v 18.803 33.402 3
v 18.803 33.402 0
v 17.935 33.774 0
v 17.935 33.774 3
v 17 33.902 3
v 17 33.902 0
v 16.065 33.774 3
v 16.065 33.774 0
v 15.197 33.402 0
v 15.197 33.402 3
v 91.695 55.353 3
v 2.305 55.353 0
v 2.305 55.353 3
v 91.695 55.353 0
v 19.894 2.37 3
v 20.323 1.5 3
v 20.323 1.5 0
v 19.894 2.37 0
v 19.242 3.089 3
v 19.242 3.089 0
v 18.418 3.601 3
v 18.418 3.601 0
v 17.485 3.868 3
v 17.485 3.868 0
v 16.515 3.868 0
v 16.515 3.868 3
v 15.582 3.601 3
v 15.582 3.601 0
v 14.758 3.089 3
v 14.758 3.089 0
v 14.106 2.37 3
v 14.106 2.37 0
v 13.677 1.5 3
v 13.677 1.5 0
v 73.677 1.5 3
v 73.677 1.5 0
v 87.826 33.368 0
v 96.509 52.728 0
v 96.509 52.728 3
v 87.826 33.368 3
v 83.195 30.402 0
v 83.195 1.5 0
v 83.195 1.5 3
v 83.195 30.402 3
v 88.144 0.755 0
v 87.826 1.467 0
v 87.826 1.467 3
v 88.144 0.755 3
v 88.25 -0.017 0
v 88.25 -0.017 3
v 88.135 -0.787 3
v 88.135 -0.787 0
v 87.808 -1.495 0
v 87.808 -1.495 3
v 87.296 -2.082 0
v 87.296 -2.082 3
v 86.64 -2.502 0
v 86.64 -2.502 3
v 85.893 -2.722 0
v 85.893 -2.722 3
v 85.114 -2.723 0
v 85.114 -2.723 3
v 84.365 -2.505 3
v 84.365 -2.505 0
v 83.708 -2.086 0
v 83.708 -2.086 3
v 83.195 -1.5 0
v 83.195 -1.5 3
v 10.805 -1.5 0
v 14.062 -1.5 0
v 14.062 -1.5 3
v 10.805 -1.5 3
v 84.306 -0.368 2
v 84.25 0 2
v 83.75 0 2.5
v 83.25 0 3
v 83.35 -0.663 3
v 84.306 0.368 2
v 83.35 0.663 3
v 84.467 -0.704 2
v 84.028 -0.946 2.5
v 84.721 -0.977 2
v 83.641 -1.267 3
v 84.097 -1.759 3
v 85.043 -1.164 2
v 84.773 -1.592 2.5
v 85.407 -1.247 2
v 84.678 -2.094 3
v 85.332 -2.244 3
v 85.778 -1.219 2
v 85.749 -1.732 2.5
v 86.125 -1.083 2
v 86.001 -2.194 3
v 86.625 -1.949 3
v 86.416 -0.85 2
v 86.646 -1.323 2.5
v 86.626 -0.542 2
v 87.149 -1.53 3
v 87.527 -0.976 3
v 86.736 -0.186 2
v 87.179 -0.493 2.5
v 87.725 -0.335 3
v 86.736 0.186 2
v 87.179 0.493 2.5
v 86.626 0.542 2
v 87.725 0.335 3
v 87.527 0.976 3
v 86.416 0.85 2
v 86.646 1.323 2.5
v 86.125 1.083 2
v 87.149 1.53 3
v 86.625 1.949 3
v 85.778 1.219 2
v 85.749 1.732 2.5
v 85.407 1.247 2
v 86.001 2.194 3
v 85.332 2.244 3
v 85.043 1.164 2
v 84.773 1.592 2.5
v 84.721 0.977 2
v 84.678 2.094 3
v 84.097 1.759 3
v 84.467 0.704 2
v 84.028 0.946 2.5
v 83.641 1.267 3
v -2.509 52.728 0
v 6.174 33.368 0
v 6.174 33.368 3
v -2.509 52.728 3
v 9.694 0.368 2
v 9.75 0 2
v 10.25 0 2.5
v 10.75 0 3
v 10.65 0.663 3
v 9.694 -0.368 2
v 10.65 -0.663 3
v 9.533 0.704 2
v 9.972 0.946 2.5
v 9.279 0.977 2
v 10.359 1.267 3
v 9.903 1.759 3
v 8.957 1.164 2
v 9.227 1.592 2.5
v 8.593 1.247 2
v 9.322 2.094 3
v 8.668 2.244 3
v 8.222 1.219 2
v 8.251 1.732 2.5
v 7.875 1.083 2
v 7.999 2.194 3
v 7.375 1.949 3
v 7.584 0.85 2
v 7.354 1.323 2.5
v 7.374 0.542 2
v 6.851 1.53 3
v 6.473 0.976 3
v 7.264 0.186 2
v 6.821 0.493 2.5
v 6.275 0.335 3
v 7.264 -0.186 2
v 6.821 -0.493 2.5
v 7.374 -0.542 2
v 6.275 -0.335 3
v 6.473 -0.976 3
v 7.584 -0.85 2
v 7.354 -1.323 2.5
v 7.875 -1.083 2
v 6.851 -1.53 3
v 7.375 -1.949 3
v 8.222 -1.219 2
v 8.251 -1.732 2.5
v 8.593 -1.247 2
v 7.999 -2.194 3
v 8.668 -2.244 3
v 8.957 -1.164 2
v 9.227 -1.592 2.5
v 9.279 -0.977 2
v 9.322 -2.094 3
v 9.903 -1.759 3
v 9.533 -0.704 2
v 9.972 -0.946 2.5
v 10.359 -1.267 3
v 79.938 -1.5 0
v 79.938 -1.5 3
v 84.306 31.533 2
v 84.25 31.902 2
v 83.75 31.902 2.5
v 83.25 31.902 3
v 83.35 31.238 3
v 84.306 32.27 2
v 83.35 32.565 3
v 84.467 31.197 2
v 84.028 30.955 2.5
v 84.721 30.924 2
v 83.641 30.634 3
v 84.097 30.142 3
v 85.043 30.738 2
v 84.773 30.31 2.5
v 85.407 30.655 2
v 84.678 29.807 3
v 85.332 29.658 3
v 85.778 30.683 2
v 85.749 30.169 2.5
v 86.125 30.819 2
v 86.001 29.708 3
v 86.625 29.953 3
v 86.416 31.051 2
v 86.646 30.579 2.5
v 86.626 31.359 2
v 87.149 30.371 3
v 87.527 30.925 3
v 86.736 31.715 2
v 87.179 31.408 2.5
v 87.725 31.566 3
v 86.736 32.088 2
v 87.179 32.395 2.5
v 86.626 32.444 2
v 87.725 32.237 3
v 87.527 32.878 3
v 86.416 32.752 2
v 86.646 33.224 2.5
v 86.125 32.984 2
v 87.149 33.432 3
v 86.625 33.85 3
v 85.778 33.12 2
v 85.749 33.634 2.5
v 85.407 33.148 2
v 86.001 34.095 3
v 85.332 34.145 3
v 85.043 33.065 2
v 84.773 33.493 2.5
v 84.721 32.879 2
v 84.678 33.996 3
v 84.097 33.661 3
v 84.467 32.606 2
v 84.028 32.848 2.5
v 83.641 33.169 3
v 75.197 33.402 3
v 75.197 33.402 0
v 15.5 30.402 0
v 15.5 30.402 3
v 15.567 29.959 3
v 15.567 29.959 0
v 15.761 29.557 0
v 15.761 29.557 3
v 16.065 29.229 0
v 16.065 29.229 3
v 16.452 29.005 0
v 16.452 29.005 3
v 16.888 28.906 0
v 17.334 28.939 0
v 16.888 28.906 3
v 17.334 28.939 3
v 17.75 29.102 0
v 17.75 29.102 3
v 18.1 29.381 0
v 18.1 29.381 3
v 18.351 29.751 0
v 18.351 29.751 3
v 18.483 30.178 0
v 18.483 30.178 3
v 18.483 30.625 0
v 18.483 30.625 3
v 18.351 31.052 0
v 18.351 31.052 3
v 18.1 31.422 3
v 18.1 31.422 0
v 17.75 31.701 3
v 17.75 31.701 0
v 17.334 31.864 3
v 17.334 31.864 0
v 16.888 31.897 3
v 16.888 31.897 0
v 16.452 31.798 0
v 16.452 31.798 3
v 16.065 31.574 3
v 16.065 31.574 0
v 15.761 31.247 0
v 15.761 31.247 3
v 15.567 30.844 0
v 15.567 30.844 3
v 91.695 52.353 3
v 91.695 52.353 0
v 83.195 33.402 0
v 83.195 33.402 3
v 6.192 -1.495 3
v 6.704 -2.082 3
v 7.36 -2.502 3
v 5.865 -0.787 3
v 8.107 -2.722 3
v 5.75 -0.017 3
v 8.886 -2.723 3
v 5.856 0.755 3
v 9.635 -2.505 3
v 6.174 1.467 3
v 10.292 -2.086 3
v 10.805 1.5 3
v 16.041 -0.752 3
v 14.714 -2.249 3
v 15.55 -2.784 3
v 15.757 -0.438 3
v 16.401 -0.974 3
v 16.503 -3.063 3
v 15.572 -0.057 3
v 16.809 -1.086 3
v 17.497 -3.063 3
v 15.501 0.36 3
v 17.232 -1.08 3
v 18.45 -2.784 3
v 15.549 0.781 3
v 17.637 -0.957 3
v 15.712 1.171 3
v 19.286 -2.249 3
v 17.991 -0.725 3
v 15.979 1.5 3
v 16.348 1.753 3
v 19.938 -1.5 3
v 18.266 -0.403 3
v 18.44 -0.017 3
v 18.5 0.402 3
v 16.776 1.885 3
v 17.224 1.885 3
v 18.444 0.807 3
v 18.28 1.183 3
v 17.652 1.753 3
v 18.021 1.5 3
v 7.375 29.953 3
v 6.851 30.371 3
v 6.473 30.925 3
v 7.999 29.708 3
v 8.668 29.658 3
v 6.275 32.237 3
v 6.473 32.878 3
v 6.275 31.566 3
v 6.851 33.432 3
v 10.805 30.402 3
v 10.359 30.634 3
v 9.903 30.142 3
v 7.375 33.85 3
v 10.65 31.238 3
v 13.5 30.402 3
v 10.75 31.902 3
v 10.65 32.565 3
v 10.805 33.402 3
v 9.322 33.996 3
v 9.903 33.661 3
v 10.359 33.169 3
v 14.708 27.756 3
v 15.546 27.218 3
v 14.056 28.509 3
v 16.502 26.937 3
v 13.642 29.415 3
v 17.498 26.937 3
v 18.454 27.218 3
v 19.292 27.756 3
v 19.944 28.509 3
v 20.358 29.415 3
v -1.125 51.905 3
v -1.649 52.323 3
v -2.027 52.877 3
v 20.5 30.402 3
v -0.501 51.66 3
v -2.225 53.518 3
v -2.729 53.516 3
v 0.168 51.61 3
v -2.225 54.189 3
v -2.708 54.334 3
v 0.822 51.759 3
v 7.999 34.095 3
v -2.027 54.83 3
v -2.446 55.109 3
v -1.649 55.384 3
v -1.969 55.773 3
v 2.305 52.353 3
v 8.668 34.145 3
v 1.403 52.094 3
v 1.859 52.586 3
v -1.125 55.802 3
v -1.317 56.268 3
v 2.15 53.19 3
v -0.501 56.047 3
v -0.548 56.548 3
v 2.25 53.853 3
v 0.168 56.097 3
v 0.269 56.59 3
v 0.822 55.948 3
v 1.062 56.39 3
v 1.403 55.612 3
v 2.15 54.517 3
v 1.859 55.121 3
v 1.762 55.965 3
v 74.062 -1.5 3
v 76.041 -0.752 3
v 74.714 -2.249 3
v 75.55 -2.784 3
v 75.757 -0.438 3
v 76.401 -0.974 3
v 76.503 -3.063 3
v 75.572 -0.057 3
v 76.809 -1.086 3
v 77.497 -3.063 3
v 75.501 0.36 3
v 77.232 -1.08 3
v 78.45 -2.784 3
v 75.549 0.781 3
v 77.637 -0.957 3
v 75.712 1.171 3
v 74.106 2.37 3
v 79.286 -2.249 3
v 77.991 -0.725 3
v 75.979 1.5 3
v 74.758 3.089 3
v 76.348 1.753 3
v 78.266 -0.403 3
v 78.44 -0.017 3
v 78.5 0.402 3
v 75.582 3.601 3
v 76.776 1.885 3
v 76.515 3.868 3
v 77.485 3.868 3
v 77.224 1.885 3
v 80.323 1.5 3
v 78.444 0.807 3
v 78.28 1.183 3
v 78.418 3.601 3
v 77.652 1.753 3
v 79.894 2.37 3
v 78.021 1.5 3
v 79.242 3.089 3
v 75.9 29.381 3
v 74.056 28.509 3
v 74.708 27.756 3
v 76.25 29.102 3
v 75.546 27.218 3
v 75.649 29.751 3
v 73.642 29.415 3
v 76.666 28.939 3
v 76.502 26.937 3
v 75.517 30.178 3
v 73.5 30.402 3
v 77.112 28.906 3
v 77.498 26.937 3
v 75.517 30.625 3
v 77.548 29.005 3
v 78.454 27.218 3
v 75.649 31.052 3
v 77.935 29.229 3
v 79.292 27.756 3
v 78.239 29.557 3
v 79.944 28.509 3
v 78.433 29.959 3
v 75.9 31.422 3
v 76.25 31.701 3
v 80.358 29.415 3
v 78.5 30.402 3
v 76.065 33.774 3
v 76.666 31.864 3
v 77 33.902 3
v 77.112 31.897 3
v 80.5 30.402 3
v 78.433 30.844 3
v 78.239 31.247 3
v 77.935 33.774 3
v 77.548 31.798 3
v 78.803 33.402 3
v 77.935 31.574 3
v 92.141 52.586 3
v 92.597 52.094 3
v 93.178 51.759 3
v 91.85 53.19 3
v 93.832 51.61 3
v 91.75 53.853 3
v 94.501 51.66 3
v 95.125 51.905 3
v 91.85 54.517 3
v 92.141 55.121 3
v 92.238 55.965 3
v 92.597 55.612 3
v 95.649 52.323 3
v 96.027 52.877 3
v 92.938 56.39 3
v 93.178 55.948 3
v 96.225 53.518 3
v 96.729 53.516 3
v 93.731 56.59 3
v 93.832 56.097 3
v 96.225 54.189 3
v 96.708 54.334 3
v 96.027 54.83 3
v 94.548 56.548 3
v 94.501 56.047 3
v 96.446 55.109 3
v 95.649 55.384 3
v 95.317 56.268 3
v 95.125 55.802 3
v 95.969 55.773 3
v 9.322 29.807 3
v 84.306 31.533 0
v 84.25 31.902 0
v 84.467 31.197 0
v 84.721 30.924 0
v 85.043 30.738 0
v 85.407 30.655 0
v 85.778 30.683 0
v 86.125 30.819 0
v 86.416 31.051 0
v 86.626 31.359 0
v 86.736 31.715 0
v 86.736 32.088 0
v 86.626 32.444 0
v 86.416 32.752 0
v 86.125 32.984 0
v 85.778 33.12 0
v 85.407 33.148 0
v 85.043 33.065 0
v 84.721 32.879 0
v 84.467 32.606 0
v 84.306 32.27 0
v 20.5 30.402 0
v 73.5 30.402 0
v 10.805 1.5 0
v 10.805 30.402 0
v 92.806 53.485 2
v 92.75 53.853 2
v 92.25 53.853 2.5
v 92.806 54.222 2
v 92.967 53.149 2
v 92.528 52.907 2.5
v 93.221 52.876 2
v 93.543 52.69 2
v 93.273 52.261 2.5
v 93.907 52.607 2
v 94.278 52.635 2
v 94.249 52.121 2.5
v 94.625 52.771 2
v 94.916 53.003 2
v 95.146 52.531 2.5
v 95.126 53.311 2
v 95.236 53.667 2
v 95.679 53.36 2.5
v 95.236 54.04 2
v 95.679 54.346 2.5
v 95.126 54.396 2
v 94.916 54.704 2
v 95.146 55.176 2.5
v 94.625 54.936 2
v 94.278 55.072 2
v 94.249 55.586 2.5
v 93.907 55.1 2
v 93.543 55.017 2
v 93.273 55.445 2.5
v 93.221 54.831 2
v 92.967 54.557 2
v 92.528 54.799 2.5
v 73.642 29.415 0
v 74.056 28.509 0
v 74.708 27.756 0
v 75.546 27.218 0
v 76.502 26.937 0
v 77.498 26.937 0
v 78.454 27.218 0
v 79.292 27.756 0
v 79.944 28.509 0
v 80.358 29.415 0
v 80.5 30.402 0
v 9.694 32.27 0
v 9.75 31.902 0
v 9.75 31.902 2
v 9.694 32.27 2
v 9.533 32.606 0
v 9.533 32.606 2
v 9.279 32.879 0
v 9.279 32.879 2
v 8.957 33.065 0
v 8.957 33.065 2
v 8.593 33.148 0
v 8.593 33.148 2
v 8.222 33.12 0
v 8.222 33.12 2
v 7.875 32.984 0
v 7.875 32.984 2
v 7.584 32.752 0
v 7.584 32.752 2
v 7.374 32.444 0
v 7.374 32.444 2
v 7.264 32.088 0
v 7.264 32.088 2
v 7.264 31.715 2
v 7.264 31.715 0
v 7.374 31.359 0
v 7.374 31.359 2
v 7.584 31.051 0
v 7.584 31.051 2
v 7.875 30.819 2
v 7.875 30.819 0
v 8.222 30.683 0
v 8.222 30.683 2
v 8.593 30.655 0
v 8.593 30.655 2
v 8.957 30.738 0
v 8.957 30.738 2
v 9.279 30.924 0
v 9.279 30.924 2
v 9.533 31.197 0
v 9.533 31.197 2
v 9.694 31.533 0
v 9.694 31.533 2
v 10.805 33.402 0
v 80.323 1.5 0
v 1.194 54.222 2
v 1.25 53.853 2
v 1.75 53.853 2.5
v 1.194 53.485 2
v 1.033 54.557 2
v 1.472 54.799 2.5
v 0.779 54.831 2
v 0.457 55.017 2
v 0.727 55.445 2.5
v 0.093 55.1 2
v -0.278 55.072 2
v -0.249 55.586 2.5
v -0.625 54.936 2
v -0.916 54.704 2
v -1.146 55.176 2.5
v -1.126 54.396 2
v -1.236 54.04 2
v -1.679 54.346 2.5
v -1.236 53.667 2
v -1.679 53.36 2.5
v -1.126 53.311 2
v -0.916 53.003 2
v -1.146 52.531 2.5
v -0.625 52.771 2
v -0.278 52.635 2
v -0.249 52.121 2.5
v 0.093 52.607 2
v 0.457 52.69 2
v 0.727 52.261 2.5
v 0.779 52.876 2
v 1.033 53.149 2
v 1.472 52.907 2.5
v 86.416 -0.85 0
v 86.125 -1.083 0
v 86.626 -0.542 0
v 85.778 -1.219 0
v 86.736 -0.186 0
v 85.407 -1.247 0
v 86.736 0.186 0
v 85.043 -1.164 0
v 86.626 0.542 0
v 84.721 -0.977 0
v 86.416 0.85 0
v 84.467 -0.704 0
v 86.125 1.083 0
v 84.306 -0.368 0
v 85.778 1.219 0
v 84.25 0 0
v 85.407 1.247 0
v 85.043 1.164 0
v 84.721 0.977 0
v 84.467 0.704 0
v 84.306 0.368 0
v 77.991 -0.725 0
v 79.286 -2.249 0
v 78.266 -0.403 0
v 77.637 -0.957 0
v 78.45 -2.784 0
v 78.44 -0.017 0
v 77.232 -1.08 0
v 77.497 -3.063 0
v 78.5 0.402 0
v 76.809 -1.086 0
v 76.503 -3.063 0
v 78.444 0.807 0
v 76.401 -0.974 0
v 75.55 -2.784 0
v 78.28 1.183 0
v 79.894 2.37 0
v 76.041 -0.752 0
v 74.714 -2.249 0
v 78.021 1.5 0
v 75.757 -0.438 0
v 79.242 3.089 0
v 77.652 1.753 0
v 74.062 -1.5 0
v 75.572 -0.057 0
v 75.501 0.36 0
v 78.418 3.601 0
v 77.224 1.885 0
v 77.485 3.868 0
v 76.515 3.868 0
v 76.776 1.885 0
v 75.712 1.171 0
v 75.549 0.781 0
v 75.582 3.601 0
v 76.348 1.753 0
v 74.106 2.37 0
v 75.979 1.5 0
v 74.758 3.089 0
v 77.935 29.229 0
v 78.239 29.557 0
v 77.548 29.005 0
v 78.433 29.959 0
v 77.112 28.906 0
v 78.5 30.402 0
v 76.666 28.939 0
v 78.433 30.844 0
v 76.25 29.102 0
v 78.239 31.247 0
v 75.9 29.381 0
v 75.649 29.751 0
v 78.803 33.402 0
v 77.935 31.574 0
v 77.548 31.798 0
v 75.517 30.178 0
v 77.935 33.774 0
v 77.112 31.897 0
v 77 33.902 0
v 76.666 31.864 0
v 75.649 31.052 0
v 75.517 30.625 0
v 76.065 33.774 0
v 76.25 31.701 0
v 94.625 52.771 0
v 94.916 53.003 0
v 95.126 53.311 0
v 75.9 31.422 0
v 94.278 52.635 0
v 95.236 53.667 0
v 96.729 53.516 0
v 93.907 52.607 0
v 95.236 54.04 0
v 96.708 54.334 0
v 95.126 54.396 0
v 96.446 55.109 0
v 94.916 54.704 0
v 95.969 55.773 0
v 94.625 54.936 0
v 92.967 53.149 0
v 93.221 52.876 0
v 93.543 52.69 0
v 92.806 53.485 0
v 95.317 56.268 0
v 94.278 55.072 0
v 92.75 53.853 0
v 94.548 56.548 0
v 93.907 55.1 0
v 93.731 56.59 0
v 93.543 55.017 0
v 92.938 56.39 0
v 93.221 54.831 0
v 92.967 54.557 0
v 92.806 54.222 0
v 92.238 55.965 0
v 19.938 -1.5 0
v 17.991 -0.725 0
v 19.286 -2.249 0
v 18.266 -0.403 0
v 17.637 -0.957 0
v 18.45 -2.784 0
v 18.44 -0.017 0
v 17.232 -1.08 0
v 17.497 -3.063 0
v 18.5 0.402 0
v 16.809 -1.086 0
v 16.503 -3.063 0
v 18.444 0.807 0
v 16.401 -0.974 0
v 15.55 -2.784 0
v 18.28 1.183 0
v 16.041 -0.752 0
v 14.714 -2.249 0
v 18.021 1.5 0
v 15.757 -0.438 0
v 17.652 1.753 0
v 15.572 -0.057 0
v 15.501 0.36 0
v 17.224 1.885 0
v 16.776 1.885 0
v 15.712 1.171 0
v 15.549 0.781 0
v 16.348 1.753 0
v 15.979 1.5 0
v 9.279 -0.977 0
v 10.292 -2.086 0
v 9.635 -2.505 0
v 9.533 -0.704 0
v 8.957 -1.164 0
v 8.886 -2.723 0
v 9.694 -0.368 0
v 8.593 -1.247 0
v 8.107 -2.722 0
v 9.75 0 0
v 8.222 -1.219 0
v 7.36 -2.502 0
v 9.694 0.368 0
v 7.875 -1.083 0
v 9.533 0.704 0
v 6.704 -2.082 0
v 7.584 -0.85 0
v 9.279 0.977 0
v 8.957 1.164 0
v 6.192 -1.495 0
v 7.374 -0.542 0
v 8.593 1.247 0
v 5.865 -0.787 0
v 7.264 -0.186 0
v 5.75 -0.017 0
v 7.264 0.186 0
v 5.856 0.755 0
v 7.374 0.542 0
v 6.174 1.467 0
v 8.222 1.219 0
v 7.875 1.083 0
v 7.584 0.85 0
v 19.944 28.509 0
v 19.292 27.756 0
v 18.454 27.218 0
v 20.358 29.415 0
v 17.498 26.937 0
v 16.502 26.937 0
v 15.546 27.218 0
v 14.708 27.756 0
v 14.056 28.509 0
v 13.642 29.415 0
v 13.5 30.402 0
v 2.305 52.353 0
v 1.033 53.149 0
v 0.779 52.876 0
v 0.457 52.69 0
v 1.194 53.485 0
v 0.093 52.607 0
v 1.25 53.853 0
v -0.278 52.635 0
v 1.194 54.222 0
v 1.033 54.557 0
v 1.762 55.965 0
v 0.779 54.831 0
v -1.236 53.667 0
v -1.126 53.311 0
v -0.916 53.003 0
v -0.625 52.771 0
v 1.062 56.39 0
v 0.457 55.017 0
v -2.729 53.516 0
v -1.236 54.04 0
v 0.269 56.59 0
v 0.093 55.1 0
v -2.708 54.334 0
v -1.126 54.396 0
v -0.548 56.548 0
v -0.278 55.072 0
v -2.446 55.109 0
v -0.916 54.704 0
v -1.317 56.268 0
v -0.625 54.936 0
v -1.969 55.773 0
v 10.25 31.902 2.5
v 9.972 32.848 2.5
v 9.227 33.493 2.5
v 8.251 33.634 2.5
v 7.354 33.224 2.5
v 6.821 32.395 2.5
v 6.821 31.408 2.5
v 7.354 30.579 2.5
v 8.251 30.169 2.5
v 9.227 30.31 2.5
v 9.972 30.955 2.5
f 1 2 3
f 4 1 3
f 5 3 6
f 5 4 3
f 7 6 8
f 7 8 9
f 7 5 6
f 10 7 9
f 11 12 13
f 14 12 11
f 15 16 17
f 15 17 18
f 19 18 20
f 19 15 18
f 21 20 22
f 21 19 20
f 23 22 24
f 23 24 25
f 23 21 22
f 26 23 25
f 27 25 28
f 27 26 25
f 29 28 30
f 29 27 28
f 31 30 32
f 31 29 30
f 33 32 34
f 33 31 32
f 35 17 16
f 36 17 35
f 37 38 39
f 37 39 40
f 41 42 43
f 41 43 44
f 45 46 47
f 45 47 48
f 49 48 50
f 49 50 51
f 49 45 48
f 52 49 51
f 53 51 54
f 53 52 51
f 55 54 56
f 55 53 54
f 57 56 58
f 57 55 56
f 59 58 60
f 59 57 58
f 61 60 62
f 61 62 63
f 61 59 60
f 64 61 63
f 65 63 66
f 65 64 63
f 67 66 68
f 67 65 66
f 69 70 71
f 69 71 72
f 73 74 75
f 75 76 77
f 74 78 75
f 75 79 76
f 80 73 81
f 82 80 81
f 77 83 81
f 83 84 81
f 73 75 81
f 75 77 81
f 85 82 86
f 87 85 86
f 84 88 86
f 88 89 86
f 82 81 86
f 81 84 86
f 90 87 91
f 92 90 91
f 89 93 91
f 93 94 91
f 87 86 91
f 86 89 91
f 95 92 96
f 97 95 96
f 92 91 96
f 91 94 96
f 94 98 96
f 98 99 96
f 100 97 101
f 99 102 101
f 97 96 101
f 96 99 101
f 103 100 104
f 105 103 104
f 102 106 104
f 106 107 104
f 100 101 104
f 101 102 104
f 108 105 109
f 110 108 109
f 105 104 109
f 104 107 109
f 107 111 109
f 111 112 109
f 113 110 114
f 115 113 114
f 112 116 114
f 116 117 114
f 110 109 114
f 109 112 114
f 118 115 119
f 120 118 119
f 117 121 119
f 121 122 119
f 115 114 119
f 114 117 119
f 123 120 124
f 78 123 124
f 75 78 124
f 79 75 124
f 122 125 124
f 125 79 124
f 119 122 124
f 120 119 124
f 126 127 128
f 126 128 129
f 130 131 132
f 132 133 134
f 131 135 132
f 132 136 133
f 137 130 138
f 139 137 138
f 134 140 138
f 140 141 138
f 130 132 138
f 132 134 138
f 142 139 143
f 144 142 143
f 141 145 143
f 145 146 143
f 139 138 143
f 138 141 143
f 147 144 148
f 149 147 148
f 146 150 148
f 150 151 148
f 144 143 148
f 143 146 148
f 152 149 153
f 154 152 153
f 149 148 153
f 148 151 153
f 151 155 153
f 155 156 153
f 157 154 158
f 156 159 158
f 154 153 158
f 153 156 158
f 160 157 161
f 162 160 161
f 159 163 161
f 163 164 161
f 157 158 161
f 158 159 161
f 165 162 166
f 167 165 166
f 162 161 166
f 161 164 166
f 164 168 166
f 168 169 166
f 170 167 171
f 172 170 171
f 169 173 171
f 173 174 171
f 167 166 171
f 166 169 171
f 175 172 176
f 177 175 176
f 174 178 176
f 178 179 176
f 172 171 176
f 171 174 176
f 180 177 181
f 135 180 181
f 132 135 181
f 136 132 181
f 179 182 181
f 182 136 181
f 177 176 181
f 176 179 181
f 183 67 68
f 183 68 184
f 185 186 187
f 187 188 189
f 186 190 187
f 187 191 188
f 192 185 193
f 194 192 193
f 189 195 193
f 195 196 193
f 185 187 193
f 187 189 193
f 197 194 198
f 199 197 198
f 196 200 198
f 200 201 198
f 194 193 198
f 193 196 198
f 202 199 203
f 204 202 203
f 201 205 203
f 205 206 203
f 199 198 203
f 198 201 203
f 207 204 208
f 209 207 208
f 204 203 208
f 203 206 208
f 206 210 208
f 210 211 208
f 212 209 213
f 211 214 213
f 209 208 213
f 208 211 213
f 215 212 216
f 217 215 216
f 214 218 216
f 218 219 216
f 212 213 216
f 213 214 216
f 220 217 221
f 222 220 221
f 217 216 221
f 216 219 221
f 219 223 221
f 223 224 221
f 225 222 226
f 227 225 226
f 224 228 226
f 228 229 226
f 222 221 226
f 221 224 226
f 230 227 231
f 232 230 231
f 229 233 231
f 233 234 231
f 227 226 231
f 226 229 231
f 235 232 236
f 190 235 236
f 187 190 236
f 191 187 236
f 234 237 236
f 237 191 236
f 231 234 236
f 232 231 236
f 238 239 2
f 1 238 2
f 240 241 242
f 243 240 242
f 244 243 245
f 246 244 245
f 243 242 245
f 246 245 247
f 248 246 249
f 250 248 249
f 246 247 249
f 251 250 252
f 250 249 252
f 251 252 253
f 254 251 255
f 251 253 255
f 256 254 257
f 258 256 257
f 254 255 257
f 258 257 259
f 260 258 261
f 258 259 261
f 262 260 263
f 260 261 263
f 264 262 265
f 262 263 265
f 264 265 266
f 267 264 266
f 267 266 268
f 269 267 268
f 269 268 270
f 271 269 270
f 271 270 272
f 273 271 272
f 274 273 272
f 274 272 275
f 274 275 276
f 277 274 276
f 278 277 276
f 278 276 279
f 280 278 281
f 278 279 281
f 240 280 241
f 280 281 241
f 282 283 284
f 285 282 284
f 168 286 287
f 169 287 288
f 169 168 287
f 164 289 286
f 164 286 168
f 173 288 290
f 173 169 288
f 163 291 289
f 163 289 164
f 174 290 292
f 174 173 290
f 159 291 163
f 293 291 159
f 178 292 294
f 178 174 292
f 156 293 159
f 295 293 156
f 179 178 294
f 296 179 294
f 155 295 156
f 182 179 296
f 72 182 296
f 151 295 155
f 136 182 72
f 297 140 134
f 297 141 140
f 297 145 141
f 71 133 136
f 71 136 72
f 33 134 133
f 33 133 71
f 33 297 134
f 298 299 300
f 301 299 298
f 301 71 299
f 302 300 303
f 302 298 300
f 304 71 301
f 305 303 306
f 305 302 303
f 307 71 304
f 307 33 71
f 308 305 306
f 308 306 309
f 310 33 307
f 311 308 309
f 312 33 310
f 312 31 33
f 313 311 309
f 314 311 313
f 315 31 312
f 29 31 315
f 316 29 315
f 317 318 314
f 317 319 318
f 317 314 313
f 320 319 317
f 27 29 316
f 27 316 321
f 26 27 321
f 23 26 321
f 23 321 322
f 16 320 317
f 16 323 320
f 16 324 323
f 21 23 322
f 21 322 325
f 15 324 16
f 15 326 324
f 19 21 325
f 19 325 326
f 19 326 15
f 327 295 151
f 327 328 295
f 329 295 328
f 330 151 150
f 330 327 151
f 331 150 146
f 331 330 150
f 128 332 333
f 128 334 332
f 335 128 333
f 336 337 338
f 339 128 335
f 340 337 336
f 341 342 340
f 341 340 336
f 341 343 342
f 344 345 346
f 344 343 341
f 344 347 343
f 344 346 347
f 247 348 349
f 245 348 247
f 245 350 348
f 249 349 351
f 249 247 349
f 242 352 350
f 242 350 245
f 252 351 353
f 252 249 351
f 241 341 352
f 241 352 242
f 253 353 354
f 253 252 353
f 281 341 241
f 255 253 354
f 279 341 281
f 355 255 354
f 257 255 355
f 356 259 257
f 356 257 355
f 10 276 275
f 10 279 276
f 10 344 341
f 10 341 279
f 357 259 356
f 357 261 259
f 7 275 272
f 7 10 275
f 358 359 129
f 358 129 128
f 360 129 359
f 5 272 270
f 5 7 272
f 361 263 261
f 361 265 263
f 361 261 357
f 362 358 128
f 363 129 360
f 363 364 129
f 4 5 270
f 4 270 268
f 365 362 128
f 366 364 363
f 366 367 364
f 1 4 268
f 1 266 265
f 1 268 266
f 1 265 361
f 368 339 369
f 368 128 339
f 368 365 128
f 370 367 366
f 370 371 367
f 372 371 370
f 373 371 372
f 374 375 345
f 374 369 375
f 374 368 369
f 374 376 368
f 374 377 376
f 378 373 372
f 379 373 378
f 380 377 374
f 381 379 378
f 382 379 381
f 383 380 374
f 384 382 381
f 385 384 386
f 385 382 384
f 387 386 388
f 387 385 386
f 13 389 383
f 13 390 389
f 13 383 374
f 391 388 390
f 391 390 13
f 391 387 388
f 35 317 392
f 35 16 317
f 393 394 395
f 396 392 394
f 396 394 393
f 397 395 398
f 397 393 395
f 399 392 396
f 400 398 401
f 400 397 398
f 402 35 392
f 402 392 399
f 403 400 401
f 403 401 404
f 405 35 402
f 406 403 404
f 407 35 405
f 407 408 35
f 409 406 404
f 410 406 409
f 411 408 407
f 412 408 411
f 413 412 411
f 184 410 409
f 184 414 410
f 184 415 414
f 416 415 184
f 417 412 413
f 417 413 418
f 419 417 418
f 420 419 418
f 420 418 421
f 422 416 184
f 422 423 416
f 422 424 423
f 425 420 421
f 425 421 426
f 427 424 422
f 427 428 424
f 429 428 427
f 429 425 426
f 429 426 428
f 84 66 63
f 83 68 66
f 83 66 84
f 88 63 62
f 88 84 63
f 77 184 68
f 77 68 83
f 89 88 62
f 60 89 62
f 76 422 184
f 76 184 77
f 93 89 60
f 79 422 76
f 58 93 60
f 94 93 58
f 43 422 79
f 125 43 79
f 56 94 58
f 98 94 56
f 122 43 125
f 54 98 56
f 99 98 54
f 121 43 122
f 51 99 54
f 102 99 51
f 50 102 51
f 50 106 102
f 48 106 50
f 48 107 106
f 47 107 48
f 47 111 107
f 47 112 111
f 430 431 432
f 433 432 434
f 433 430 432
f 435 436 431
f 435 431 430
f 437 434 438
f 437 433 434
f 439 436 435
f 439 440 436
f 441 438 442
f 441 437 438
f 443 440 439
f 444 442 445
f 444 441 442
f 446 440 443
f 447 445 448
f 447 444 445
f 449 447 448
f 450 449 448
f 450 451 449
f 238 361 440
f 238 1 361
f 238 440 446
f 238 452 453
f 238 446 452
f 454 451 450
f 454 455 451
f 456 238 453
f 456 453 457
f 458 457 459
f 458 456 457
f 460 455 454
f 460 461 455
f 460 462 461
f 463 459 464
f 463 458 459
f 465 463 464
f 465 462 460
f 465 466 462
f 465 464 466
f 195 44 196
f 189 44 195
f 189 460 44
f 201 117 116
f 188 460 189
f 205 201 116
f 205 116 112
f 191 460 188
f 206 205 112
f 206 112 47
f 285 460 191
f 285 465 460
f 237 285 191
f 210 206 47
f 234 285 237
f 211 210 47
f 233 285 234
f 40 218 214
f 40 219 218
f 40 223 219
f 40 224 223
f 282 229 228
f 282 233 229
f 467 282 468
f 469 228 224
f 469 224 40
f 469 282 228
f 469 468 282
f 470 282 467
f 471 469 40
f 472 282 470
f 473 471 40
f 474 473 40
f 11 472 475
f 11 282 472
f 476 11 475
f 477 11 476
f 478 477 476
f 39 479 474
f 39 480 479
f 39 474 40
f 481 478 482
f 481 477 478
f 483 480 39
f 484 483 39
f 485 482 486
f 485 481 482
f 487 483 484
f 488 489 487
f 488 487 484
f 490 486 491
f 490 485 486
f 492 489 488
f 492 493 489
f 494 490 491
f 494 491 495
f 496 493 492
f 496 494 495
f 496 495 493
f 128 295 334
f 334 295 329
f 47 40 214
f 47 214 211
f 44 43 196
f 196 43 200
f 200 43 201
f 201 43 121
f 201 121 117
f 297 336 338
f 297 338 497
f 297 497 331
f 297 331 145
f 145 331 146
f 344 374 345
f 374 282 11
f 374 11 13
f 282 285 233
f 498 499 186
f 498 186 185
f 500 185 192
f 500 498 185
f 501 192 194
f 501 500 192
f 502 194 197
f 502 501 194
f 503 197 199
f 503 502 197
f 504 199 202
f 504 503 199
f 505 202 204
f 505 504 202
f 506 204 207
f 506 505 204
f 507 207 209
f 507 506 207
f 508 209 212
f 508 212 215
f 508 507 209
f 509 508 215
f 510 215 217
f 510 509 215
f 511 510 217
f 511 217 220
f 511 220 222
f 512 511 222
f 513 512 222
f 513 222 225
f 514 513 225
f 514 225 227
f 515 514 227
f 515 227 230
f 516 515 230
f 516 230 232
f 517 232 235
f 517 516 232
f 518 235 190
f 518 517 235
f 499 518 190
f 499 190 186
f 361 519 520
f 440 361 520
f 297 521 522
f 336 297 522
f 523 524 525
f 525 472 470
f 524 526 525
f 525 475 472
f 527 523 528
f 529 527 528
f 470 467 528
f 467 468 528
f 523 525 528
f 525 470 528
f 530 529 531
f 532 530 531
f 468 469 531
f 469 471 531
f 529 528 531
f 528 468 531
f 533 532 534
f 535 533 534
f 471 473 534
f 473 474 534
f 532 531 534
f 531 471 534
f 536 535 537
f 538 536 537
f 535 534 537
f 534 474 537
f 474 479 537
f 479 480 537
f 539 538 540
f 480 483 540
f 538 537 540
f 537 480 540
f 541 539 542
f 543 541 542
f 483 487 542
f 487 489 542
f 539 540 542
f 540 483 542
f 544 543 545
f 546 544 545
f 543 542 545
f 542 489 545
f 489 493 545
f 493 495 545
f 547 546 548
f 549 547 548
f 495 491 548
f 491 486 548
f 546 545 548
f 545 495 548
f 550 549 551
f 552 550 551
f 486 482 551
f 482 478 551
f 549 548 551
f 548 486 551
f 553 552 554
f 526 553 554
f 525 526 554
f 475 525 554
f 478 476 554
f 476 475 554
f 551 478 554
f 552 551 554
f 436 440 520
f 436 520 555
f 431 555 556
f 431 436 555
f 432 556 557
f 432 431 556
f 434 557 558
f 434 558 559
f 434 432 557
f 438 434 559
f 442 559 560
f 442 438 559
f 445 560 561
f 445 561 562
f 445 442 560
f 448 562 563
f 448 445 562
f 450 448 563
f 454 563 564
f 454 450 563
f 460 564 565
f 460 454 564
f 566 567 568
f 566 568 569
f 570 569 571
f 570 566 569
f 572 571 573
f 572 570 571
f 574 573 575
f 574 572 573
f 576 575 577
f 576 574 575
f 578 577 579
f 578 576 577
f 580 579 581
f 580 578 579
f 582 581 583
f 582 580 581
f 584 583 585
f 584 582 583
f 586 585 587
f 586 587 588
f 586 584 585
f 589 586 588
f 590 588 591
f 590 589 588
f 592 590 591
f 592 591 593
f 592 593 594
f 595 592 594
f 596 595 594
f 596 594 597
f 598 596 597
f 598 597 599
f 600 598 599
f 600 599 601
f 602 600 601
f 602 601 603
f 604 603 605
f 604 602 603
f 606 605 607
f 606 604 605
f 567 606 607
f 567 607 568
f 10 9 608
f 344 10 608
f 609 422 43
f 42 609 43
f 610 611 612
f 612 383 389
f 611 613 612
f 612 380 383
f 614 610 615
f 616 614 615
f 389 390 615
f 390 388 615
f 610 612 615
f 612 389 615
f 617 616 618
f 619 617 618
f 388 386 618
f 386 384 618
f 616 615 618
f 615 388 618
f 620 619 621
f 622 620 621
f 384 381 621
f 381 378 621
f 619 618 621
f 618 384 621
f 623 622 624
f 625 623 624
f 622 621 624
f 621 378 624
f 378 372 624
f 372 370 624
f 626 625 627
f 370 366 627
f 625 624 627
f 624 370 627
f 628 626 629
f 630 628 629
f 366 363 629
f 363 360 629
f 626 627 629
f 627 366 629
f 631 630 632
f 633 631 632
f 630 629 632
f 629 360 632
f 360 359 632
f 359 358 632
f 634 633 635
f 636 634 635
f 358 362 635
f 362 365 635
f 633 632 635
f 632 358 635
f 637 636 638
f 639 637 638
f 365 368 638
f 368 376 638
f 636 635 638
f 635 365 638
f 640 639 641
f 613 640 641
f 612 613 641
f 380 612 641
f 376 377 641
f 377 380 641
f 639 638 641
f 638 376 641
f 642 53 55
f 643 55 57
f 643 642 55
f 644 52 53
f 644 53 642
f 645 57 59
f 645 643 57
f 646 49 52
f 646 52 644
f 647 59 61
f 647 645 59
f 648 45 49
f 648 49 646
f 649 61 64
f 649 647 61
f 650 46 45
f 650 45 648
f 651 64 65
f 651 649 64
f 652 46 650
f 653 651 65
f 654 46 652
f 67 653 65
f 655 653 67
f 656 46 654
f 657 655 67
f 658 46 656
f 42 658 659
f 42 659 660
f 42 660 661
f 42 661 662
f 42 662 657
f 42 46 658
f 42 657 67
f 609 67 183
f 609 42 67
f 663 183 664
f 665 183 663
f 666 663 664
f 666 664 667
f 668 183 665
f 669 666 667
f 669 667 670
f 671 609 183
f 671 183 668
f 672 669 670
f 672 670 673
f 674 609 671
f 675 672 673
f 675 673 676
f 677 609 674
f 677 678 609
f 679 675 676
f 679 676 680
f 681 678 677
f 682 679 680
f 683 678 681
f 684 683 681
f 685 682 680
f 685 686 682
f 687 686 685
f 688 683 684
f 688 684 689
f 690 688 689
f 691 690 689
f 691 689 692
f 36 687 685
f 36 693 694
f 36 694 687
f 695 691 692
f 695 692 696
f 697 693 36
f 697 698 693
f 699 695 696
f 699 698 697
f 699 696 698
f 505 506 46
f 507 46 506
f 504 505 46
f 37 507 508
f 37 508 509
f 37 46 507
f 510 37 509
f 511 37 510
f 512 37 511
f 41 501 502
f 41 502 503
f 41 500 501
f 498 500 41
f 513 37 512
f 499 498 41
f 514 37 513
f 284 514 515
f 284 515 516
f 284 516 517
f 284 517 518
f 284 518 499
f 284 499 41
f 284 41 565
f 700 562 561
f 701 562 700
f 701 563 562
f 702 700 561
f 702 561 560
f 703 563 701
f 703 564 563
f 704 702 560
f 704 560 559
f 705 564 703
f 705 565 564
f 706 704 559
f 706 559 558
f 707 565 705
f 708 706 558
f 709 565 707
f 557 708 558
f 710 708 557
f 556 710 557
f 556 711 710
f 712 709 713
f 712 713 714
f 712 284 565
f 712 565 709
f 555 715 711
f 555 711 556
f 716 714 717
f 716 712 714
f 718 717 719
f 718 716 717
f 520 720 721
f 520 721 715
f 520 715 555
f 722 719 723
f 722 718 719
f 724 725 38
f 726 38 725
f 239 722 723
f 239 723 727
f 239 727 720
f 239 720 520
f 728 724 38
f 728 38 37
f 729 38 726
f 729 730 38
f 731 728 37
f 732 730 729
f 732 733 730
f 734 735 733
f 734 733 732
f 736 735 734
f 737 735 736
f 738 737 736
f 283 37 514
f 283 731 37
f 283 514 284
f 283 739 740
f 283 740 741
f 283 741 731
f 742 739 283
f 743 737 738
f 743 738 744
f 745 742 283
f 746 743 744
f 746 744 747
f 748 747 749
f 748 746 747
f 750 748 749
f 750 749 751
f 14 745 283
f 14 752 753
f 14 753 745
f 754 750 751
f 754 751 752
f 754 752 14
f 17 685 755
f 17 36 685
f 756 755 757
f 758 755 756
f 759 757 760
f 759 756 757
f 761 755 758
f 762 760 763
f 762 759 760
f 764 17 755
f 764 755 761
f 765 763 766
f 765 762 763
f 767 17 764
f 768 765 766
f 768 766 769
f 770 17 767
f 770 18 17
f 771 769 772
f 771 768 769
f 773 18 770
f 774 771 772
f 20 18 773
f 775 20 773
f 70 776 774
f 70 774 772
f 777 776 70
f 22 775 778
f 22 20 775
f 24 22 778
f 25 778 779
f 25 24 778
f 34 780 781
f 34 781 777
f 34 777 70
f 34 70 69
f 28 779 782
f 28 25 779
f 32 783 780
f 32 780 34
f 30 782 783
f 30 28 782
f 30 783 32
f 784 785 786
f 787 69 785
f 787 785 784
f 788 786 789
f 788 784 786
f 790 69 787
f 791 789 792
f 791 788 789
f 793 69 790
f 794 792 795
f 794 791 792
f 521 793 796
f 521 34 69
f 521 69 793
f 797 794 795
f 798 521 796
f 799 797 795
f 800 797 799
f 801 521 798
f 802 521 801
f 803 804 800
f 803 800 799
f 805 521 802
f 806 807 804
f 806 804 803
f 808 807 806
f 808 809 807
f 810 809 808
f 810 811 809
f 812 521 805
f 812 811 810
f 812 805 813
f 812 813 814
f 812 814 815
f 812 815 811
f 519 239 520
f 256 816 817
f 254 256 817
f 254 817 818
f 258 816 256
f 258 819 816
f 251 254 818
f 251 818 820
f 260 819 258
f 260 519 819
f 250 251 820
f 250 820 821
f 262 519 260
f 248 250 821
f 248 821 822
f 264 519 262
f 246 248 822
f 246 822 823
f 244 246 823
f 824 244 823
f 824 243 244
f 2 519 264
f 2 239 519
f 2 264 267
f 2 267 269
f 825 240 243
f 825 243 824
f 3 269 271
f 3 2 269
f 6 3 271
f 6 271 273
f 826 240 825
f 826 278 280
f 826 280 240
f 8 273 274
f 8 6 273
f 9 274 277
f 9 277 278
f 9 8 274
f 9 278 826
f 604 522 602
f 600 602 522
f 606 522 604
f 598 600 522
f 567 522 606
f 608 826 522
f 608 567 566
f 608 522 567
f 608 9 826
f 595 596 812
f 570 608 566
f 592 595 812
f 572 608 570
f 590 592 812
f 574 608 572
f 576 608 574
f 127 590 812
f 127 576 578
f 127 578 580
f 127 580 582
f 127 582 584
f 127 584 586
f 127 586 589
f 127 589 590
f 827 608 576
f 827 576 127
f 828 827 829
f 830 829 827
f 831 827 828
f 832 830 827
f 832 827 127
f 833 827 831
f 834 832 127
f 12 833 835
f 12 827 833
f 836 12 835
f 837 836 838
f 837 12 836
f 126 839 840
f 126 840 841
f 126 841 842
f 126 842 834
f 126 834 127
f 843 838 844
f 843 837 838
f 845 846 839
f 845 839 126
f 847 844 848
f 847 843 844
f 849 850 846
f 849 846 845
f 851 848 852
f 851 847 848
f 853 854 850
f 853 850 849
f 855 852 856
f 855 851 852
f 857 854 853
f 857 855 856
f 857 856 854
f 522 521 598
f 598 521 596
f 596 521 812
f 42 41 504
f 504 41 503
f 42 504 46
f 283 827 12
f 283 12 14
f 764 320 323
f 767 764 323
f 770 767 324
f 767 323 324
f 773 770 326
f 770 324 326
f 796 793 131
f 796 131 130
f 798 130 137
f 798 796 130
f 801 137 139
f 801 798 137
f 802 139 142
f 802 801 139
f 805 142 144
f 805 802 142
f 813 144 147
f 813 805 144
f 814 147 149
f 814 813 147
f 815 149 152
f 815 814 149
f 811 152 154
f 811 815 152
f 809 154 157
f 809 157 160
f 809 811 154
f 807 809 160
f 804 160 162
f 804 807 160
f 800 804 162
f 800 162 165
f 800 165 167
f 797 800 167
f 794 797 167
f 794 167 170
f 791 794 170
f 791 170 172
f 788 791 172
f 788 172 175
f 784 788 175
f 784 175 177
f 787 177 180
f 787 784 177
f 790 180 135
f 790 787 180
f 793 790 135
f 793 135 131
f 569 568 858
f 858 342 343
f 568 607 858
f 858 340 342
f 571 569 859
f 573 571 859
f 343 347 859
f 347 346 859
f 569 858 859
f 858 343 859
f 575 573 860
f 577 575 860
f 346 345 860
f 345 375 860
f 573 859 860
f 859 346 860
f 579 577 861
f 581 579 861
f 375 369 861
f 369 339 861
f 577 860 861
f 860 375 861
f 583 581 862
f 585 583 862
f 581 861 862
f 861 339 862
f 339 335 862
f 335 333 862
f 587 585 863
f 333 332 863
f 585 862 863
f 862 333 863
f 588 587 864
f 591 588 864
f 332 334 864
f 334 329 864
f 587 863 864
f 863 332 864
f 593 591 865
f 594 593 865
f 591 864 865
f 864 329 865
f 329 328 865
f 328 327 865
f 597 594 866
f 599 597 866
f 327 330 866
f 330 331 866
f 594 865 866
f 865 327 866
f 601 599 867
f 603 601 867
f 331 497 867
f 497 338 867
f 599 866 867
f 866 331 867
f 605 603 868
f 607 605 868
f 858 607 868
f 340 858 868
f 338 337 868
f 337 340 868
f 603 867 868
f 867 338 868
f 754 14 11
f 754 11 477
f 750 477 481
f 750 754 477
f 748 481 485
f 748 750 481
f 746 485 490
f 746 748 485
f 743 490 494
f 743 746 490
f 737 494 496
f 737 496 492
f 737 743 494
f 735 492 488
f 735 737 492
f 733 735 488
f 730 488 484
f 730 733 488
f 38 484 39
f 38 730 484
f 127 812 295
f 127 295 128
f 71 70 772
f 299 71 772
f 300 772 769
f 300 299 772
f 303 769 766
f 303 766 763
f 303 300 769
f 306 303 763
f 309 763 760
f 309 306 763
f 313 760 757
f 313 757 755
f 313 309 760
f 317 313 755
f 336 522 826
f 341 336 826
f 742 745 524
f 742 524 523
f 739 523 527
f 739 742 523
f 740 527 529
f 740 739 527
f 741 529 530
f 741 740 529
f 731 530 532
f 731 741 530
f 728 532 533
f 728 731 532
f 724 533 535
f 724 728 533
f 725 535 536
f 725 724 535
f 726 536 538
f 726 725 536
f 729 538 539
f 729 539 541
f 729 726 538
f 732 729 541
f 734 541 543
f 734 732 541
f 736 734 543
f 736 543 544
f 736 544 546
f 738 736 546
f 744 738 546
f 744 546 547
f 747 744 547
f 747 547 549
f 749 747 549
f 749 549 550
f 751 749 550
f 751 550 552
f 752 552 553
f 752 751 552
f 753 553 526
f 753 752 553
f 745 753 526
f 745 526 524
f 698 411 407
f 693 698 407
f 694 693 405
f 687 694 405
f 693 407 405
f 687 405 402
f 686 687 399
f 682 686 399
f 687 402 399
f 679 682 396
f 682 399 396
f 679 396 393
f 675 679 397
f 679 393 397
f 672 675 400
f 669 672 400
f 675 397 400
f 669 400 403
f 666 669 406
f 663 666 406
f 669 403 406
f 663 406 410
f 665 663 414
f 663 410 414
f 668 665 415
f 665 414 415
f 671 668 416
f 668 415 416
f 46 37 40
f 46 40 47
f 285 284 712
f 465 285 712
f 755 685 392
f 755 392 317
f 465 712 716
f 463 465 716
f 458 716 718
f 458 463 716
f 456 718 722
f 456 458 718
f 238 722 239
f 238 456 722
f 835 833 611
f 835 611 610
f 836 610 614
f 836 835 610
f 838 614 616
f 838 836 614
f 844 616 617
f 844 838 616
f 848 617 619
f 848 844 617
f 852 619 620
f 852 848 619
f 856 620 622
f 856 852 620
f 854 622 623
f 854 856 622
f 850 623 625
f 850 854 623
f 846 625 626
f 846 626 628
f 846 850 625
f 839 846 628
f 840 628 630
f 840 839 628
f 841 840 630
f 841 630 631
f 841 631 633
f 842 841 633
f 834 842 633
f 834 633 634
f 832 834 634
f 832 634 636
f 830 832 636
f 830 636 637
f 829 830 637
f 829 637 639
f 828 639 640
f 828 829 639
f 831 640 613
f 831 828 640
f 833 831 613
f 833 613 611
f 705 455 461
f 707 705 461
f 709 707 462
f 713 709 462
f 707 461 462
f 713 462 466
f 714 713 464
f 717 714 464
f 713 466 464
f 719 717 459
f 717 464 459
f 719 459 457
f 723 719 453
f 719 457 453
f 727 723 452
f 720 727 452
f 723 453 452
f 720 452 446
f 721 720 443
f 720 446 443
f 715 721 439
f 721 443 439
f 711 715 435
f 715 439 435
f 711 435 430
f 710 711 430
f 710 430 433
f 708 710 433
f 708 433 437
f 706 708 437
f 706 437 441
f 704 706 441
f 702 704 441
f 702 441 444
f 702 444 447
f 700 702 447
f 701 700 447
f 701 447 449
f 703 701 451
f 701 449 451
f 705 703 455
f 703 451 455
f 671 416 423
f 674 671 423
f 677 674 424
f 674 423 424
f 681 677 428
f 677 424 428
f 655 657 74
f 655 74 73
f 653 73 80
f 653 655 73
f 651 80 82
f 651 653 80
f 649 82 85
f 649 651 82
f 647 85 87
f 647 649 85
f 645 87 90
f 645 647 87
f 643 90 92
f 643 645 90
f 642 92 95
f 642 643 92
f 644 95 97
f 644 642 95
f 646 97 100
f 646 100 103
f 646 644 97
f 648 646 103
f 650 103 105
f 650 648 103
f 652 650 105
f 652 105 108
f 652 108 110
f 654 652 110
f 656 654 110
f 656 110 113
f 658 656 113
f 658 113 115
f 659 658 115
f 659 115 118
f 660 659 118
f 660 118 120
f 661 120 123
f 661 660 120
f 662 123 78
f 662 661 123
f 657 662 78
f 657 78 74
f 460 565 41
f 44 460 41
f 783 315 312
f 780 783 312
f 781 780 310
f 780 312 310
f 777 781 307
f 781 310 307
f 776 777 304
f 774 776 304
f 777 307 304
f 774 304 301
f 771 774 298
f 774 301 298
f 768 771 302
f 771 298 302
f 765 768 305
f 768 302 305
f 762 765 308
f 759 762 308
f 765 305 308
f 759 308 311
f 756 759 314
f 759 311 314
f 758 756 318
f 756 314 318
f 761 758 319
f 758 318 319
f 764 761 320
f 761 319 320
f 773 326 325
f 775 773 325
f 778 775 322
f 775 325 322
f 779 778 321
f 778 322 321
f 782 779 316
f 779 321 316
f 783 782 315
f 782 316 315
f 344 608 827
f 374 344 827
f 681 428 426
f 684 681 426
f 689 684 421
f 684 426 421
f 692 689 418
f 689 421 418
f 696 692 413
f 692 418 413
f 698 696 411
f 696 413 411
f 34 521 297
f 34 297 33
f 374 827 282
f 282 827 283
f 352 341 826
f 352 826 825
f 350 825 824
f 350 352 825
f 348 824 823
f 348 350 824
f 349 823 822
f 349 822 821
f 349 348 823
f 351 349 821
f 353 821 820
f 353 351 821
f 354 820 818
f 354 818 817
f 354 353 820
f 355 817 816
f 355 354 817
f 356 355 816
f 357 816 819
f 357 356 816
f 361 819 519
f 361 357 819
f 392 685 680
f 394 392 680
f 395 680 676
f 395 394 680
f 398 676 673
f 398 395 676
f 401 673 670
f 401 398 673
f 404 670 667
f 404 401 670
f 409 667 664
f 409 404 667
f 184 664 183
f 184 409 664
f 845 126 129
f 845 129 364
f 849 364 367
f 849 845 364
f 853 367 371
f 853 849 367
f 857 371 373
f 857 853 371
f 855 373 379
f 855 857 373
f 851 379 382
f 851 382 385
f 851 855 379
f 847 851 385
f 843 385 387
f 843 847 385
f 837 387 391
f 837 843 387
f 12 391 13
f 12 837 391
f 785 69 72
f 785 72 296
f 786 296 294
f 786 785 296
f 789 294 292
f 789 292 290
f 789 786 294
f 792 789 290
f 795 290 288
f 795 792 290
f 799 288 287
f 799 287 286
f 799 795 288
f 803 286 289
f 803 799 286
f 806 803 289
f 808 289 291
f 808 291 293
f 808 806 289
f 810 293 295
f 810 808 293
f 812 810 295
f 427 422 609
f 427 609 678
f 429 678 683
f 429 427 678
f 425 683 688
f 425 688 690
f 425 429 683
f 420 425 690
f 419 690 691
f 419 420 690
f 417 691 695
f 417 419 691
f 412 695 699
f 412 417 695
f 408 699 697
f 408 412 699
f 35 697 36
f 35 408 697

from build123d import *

# Parameters (mm, degrees)
SKETCH1_R           = 1.25
SKETCH1_W           = 72.390227772
SKETCH1_H           = 28.901521269
BOSS_EXTRUDE1_DEPTH = 3
CHAMFER1_SIZE       = 1
SKETCH2_R           = 3.5
BOSS_EXTRUDE2_DEPTH = 3
CUT_EXTRUDE1_DEPTH  = 3


with BuildPart() as part:
    # Sketch1 → Boss-Extrude1 (new body)
    with BuildSketch(Plane.XY):
        with BuildLine():
            Line((6.173773471, 33.368208058), (-2.509184891, 52.727938114))
            ThreePointArc((-2.509184891, 52.727938114), (-1.316660917, 56.267635348), (2.304886114, 55.353323017))
            Line((2.304886114, 55.353323017), (91.695113886, 55.353323017))
            ThreePointArc((91.695113886, 55.353323017), (95.316660917, 56.267635348), (96.509184891, 52.727938114))
            Line((96.509184891, 52.727938114), (87.826226529, 33.368208058))
            Line((87.826226529, 33.368208058), (87.826226529, 1.466686789))
            ThreePointArc((87.826226529, 1.466686789), (86.983381771, -2.315616229), (83.195113886, -1.5))
            Line((83.195113886, -1.5), (10.804886114, -1.5))
            ThreePointArc((10.804886114, -1.5), (7.016618229, -2.315616229), (6.173773471, 1.466686789))
            Line((6.173773471, 1.466686789), (6.173773471, 33.368208058))
        make_face()
        with Locations((0, 53.853323017)):
            Circle(SKETCH1_R, mode=Mode.SUBTRACT)
        with Locations((8.5, 31.901521269)):
            Circle(SKETCH1_R, mode=Mode.SUBTRACT)
        with Locations((8.5, 0)):
            Circle(SKETCH1_R, mode=Mode.SUBTRACT)
        with Locations(Location((85.5, 0, 0), (0, 0, 180))):
            Circle(SKETCH1_R, mode=Mode.SUBTRACT)
        with Locations(Location((85.5, 31.901521269, 0), (0, 0, 180))):
            Circle(SKETCH1_R, mode=Mode.SUBTRACT)
        with Locations(Location((94, 53.853323017, 0), (0, 0, 180))):
            Circle(SKETCH1_R, mode=Mode.SUBTRACT)
        Polygon((10.804886114, 33.401521269), (2.304886114, 52.353323017), (91.695113886, 52.353323017), (83.195113886, 33.401521269), align=None, mode=Mode.SUBTRACT)
        with Locations((47, 15.950760635)):
            Rectangle(SKETCH1_W, SKETCH1_H, mode=Mode.SUBTRACT)
    extrude(amount=BOSS_EXTRUDE1_DEPTH)

    # Chamfer1
    chamfer1_edges = [part.edges().sort_by_distance(p)[0] for p in [
        (-1.25, 53.853323017, 3),
        (7.25, 31.901521269, 3),
        (7.25, 0, 3),
        (86.75, 0, 3),
        (86.75, 31.901521269, 3),
        (95.25, 53.853323017, 3),
    ]]
    chamfer(chamfer1_edges, length=CHAMFER1_SIZE)

    # Sketch2 → Boss-Extrude2 (add)
    with BuildSketch(Plane.XY.offset(3)):
        with Locations((17, 30.401521269)):
            Circle(SKETCH2_R)
        with Locations((17, 0.401521269)):
            Circle(SKETCH2_R)
        with Locations((77, 30.401521269)):
            Circle(SKETCH2_R)
        with Locations((77, 0.401521269)):
            Circle(SKETCH2_R)
    extrude(amount=-BOSS_EXTRUDE2_DEPTH)

    # Sketch2<3> → Cut-Extrude1 (cut)
    with BuildSketch(Plane.XY.offset(3)):
        with BuildLine():
            Line((15.978557649, 1.5), (18.021442351, 1.5))
            ThreePointArc((18.021442351, 1.5), (17, 1.901521269), (15.978557649, 1.5))
        make_face()
        with BuildLine():
            ThreePointArc((18.5, 0.401521269), (18.375166086, 1.000619121), (18.021442351, 1.5))
            Line((18.021442351, 1.5), (15.978557649, 1.5))
            ThreePointArc((15.978557649, 1.5), (16.400902148, -0.973644817), (18.5, 0.401521269))
        make_face()
        with BuildLine():
            Line((15.5, 30.401521269), (18.5, 30.401521269))
            ThreePointArc((18.5, 30.401521269), (17, 31.901521269), (15.5, 30.401521269))
        make_face()
        with BuildLine():
            ThreePointArc((15.5, 30.401521269), (17, 28.901521269), (18.5, 30.401521269))
            Line((18.5, 30.401521269), (15.5, 30.401521269))
        make_face()
        with BuildLine():
            Line((78.5, 30.401521269), (75.5, 30.401521269))
            ThreePointArc((75.5, 30.401521269), (77, 28.901521269), (78.5, 30.401521269))
        make_face()
        with BuildLine():
            ThreePointArc((78.5, 30.401521269), (77, 31.901521269), (75.5, 30.401521269))
            Line((75.5, 30.401521269), (78.5, 30.401521269))
        make_face()
        with BuildLine():
            Line((78.021442351, 1.5), (75.978557649, 1.5))
            ThreePointArc((75.978557649, 1.5), (76.400902148, -0.973644817), (78.5, 0.401521269))
            ThreePointArc((78.5, 0.401521269), (78.375166086, 1.000619121), (78.021442351, 1.5))
        make_face()
        with BuildLine():
            ThreePointArc((78.021442351, 1.5), (77, 1.901521269), (75.978557649, 1.5))
            Line((75.978557649, 1.5), (78.021442351, 1.5))
        make_face()
    extrude(amount=-CUT_EXTRUDE1_DEPTH, mode=Mode.SUBTRACT)


solid = part.part
